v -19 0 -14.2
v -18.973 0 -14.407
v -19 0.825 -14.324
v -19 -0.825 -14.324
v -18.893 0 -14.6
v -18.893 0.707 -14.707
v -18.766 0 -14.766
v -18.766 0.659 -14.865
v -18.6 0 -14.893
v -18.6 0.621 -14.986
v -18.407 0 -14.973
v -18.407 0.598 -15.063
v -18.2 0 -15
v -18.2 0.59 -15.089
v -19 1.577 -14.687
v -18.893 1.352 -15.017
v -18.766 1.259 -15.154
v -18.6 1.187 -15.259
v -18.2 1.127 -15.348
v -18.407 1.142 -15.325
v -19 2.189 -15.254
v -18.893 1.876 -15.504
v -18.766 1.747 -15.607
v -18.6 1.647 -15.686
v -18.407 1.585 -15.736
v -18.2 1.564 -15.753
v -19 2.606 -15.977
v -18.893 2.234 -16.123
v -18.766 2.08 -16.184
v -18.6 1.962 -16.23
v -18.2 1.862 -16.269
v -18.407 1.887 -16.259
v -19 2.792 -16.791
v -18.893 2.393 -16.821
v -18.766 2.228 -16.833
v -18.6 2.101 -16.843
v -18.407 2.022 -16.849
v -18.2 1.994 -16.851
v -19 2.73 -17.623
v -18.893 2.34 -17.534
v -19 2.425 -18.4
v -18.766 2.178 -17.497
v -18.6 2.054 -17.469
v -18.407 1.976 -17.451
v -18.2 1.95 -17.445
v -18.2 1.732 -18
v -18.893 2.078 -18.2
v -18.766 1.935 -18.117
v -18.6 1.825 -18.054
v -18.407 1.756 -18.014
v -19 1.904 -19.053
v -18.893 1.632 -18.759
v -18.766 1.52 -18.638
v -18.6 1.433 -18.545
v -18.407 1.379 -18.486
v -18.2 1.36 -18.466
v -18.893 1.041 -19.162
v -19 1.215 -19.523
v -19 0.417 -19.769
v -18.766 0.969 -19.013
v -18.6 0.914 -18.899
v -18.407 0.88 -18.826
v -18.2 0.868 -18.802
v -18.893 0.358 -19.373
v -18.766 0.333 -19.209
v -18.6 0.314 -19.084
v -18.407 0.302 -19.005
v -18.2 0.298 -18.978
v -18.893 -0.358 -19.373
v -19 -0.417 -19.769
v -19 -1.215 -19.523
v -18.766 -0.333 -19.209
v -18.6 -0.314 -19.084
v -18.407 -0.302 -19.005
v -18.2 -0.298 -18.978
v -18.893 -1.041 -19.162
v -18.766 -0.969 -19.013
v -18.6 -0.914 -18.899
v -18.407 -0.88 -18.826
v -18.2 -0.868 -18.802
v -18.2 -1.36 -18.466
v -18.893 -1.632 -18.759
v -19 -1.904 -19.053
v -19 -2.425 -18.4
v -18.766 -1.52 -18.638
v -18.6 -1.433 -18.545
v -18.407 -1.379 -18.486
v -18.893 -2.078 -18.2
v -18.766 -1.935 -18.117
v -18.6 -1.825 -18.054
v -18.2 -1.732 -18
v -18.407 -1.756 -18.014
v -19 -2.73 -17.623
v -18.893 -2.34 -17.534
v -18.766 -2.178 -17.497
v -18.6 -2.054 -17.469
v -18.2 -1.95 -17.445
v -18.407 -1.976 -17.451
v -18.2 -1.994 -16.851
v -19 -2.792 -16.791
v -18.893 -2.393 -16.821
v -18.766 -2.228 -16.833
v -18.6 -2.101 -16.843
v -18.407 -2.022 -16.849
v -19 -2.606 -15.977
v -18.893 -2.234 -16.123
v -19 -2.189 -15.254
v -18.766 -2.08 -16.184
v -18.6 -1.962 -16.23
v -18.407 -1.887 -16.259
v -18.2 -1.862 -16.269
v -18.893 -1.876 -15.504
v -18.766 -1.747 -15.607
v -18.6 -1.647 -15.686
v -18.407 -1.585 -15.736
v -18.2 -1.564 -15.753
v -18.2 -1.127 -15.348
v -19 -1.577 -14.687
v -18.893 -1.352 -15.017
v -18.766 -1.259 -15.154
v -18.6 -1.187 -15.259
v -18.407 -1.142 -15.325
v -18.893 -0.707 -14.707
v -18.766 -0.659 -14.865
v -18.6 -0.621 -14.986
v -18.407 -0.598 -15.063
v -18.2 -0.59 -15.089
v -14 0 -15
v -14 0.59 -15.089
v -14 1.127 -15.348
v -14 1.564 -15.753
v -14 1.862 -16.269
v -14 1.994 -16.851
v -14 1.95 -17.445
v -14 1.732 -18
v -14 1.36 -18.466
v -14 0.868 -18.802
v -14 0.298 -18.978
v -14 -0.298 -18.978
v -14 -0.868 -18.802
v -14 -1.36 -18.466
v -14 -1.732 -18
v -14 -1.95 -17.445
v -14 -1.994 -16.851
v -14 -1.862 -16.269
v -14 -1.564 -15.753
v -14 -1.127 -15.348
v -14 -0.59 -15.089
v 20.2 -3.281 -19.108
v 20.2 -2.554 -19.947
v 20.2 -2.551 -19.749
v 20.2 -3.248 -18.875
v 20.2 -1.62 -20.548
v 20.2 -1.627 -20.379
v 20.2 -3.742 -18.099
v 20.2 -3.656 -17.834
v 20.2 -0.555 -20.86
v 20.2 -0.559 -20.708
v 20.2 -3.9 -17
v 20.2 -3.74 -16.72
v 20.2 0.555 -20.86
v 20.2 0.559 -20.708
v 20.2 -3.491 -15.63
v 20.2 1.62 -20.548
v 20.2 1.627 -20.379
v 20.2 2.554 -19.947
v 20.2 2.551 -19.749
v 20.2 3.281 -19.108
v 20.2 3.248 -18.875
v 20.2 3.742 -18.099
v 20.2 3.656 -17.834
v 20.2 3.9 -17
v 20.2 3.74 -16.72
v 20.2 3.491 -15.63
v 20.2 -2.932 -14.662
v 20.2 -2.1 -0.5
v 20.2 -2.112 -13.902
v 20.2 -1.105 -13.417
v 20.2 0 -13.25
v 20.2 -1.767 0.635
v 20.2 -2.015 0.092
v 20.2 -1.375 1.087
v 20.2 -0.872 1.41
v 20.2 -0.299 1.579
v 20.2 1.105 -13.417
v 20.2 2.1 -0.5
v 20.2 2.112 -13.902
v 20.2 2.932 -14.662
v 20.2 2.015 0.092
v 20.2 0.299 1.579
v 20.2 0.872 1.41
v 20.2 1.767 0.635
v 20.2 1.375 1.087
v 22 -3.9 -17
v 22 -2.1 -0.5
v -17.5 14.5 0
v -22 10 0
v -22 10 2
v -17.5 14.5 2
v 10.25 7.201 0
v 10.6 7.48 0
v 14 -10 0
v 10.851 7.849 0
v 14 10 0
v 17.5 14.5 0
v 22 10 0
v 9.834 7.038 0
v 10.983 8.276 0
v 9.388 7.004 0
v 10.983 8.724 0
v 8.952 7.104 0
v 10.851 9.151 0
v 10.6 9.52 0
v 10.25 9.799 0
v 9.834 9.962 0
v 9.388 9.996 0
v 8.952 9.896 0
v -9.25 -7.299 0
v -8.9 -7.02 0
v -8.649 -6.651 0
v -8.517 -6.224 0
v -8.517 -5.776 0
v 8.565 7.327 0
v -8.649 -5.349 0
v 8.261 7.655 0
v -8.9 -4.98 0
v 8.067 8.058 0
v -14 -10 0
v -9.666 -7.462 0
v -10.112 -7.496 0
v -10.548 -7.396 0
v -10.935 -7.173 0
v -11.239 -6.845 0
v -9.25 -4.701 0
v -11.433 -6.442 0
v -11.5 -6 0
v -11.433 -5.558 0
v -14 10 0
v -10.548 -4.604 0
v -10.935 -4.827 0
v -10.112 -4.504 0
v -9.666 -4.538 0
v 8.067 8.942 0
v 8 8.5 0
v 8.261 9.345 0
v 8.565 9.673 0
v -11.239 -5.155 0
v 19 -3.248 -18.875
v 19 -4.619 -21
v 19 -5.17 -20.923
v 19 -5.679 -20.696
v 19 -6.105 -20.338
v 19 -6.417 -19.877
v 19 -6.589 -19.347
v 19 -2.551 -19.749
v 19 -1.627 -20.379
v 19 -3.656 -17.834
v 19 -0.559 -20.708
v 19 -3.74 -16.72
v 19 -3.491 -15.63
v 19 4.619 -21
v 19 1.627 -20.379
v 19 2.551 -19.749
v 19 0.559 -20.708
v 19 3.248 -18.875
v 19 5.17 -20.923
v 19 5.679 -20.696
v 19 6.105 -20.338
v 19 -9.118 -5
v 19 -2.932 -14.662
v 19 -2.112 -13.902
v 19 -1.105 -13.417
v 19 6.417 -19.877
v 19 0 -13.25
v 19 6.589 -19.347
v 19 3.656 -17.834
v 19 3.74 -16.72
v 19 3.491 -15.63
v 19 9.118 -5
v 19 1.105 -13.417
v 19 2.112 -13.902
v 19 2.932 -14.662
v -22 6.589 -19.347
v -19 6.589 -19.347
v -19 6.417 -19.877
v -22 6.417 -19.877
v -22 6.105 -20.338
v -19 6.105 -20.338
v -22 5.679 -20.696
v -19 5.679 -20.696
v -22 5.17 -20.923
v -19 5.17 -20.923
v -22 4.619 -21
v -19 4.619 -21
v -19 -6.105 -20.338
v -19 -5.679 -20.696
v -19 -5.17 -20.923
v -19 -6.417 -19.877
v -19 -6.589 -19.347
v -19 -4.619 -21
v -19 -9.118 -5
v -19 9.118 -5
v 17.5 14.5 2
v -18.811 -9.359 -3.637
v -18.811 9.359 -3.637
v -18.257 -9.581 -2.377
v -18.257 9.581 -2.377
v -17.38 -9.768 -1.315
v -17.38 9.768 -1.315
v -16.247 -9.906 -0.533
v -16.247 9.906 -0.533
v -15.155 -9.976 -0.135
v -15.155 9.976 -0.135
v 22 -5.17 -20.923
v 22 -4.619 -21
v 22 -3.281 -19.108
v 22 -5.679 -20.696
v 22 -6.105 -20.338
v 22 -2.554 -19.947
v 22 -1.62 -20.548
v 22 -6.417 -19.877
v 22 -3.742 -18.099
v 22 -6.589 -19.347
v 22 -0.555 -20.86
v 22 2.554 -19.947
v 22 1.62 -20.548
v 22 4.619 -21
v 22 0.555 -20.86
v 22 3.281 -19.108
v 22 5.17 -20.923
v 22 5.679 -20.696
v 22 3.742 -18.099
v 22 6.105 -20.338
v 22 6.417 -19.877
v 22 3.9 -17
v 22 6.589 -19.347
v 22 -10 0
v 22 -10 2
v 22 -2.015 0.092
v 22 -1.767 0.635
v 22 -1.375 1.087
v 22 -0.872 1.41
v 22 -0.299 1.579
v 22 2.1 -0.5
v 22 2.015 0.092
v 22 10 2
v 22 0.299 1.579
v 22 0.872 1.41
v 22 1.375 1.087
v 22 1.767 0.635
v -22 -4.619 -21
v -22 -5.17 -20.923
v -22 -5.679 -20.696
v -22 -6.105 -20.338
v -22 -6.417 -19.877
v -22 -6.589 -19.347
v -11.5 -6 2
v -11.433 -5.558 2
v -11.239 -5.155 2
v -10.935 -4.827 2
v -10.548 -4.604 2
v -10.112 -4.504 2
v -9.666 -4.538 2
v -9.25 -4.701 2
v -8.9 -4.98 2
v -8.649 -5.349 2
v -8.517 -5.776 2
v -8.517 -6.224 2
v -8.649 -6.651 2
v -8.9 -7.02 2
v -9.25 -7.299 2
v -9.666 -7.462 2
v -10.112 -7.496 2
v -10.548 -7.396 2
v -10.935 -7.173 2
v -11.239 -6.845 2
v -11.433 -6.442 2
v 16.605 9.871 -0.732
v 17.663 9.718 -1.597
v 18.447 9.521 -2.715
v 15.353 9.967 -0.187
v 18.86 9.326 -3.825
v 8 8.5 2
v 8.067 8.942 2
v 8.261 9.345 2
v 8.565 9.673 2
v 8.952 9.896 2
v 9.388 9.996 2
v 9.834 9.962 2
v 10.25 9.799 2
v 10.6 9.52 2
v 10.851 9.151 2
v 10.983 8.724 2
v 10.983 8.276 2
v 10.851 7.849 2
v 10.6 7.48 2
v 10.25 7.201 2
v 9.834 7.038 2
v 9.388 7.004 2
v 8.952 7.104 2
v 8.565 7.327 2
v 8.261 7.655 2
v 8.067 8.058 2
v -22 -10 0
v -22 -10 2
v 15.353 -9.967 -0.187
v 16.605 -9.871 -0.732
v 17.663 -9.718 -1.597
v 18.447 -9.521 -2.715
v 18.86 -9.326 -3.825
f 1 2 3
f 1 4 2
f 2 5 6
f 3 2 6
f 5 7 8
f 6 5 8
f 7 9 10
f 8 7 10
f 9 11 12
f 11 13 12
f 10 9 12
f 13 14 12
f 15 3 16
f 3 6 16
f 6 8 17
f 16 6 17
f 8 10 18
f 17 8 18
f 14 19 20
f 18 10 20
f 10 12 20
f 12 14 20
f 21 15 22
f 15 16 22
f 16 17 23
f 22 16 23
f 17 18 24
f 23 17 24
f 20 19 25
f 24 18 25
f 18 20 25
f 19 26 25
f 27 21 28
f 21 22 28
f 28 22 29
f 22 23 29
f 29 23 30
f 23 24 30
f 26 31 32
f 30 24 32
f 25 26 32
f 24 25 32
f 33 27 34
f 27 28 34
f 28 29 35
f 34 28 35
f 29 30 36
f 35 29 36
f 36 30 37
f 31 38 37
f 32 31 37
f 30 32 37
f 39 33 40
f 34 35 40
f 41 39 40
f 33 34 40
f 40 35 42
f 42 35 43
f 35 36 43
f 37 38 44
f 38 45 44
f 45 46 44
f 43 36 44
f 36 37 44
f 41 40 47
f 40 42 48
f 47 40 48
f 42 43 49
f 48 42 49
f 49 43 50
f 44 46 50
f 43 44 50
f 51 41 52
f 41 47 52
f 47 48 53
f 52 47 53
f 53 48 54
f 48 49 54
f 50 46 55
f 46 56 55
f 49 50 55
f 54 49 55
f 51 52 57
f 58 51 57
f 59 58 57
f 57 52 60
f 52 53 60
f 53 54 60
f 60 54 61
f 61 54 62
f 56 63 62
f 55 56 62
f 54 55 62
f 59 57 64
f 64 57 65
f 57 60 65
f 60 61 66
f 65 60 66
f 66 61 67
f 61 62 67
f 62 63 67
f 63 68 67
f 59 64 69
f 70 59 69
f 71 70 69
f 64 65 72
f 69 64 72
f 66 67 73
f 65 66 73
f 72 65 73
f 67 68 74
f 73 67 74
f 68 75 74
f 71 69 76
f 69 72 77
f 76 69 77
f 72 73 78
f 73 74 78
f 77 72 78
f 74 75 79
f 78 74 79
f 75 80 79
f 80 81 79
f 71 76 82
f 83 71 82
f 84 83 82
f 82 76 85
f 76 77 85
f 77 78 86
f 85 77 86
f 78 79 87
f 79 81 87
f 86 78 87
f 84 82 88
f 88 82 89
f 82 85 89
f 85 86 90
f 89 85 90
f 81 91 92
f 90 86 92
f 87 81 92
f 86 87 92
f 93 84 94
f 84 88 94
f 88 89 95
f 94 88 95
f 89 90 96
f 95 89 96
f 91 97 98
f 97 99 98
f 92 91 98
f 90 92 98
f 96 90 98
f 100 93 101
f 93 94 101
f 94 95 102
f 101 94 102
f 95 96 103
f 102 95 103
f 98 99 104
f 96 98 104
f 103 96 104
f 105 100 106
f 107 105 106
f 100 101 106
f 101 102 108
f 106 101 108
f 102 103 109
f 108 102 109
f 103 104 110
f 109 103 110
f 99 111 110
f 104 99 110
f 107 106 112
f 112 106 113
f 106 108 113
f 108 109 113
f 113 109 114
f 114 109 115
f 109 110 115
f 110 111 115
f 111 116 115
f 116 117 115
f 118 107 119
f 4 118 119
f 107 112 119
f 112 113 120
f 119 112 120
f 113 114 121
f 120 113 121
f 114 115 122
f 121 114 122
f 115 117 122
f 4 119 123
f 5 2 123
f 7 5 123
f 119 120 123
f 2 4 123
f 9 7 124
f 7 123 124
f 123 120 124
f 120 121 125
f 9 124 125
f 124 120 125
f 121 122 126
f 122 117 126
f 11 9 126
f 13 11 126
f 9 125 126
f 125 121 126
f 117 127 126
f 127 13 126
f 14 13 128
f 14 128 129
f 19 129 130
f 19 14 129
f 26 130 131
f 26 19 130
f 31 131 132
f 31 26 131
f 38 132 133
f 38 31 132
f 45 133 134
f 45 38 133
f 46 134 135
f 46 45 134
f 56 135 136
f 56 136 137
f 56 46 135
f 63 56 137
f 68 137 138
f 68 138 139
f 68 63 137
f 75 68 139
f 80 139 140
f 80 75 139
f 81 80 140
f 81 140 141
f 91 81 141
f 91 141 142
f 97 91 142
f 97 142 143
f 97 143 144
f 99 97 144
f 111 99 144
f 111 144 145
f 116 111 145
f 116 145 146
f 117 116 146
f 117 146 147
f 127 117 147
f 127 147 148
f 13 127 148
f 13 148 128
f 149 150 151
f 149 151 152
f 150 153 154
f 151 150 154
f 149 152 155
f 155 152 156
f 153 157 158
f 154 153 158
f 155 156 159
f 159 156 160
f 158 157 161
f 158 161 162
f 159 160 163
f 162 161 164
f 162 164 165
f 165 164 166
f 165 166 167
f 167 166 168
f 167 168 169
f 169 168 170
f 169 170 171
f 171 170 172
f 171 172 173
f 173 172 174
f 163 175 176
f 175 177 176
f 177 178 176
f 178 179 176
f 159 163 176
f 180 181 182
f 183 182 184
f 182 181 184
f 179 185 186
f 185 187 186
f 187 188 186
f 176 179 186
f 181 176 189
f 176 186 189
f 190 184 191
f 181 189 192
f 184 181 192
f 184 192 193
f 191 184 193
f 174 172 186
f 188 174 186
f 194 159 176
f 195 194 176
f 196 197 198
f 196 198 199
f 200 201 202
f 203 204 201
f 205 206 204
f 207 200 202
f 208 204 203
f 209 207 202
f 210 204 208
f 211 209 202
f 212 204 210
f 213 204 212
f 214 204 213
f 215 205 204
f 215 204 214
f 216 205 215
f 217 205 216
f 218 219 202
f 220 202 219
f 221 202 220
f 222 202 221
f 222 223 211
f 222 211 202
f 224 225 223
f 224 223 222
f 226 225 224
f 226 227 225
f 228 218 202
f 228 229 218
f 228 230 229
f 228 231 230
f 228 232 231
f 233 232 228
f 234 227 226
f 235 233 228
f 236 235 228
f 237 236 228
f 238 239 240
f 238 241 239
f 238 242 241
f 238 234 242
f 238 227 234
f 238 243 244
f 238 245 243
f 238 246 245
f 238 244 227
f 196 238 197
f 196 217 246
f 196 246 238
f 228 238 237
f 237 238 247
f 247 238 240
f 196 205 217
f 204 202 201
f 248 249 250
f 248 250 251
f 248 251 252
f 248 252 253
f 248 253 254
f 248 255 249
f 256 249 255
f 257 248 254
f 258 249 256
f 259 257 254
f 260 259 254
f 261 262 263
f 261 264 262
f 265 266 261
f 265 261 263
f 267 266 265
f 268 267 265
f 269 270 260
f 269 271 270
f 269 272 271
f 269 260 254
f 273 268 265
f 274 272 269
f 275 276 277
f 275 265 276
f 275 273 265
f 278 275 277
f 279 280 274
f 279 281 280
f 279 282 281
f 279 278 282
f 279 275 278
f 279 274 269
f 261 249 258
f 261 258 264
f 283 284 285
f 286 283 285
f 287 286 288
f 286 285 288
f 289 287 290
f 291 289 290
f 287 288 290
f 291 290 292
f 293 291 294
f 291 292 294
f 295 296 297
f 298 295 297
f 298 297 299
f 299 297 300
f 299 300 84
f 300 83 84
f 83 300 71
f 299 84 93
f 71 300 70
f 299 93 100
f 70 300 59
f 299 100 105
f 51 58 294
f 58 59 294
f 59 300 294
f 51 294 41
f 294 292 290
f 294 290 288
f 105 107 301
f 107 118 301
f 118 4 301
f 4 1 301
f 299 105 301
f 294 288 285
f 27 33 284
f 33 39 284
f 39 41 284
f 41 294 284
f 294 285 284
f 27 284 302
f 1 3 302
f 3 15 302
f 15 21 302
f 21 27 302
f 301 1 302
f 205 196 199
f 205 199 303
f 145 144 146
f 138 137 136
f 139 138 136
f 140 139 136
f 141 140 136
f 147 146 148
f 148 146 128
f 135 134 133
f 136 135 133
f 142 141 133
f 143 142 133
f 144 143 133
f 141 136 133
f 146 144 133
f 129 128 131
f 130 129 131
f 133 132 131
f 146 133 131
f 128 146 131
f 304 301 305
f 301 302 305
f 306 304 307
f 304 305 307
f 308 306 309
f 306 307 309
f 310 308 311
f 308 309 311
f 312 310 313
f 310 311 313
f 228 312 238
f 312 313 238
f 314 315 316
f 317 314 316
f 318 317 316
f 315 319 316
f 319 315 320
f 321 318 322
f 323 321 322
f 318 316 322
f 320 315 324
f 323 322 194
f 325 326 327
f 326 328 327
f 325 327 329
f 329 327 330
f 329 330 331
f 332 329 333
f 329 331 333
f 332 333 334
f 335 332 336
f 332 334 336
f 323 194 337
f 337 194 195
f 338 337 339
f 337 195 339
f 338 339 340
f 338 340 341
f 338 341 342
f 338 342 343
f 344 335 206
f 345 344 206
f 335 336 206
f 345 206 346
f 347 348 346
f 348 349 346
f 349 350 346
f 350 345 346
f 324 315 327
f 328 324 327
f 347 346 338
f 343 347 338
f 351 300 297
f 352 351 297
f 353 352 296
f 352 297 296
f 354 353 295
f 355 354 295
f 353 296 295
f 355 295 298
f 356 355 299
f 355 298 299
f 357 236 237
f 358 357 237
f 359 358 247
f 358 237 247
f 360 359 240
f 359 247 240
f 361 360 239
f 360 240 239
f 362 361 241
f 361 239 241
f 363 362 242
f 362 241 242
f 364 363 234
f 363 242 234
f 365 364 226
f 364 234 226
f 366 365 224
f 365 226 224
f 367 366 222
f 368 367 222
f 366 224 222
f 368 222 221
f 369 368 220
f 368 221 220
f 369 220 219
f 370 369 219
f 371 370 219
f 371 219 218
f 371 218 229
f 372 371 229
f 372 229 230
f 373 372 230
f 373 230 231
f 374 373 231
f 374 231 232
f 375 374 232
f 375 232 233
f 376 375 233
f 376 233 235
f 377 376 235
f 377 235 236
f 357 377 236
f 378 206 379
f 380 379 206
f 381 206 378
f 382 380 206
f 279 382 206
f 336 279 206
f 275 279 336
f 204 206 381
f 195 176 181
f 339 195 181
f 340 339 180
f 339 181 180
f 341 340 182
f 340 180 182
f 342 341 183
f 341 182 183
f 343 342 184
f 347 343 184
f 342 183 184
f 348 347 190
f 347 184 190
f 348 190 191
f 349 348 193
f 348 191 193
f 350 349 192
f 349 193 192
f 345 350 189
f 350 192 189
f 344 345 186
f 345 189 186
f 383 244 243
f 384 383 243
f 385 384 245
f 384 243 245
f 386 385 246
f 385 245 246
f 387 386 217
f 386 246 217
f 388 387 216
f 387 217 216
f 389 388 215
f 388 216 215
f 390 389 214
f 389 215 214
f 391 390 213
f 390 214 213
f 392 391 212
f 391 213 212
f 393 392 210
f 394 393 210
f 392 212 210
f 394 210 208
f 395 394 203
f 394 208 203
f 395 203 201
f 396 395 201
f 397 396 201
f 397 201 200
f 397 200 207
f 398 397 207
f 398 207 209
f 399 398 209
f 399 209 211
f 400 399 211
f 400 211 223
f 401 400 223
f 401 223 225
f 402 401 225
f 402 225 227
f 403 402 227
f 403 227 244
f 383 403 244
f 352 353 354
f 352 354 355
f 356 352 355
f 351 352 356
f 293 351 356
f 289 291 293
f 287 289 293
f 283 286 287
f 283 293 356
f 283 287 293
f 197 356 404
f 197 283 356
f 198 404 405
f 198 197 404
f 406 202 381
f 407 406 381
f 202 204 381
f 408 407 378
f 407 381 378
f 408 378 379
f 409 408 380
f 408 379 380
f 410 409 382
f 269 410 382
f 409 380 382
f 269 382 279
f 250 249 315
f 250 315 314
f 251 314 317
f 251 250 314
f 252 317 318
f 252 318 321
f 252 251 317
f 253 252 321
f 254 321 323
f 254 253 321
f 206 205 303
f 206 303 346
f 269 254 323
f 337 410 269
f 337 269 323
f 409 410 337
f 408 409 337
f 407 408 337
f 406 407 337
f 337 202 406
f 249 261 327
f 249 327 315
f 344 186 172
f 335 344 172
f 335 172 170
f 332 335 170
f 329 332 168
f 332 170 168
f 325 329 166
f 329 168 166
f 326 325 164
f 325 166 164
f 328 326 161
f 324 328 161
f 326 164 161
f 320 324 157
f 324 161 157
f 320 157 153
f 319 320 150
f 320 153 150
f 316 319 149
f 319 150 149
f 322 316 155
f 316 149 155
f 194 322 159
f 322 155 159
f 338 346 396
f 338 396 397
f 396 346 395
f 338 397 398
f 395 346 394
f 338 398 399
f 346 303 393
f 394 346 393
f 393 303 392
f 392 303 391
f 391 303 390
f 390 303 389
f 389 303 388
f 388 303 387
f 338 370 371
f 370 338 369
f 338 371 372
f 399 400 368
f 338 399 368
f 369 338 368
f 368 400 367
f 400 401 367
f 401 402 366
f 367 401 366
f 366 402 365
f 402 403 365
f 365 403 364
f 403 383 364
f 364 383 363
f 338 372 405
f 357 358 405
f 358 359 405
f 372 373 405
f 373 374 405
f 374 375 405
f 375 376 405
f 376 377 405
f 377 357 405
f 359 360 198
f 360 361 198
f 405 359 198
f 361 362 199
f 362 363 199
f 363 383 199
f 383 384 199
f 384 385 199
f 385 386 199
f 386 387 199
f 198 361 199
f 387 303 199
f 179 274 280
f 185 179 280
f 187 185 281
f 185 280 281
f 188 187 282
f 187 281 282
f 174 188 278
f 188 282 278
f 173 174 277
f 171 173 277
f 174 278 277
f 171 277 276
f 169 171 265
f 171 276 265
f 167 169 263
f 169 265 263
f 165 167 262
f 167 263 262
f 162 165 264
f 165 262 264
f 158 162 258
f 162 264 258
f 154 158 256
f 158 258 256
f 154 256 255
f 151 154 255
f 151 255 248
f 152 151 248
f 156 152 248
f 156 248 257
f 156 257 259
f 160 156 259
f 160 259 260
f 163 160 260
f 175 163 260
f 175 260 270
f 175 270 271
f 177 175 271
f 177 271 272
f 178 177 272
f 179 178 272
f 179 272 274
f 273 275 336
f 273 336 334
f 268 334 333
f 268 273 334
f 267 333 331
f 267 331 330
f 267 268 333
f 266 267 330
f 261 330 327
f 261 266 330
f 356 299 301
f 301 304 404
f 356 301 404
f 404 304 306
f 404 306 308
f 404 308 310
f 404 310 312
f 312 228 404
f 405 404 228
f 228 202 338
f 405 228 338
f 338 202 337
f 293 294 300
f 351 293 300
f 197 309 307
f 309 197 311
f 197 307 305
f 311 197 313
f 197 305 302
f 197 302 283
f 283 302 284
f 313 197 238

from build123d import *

# Parameters (mm, degrees)
SKETCH1_W           = 38
SKETCH1_H           = 20
BOSS_EXTRUDE1_DEPTH = 2
BOSS_EXTRUDE2_DEPTH = 3
BOSS_EXTRUDE3_DEPTH = 2
SKETCH4_R           = 1.6
CUT_EXTRUDE1_DEPTH  = 51.865017448
CUT_EXTRUDE2_START  = -1.2
CUT_EXTRUDE2_DEPTH  = 2
SKETCH6_R           = 3.75
CUT_EXTRUDE3_DEPTH  = 2.4
CUT_EXTRUDE4_DEPTH  = 34.693471178
SKETCH8_R           = 2
BOSS_EXTRUDE4_DEPTH = 8
FILLET1_R           = 0.8
FILLET2_R           = 5
SKETCH9_R           = 1.5
CUT_EXTRUDE5_DEPTH  = 10


with BuildPart() as part:
    # Sketch1 → Boss-Extrude1 (new body)
    with BuildSketch(Plane.XY):
        Rectangle(SKETCH1_W, SKETCH1_H)
    extrude(amount=BOSS_EXTRUDE1_DEPTH)

    # Sketch2 → Boss-Extrude2 (add)
    with BuildSketch(Plane(origin=(19, 0, 0), x_dir=(0, 0, -1), z_dir=(1, 0, 0))):
        with BuildLine():
            Line((-2, 10), (0, 10))
            Line((0, 10), (19.347296355, 6.588549649))
            ThreePointArc((19.347296355, 6.588549649), (20.532088886, 5.904509362), (21, 4.618934143))
            Line((21, 4.618934143), (21, -4.618934143))
            ThreePointArc((21, -4.618934143), (20.532088886, -5.904509362), (19.347296355, -6.588549649))
            Line((19.347296355, -6.588549649), (0, -10))
            Line((0, -10), (-2, -10))
            Line((-2, -10), (-2, 10))
        make_face()
    boss_extrude2 = extrude(amount=BOSS_EXTRUDE2_DEPTH)

    # Mirror1: Boss-Extrude2 across plane
    add(boss_extrude2.mirror(Plane(origin=(0, 0, 0), x_dir=(0, 0, 1), z_dir=(1, 0, 0))))

    # Sketch3 → Boss-Extrude3 (add)
    with BuildSketch(Plane(origin=(0, 0, 0), x_dir=(-1, 0, 0), z_dir=(0, 0, -1))):
        Polygon((-22, -10), (-17.5, -14.5), (17.5, -14.5), (22, -10), align=None)
        Polygon((-22, 10), (22, 10), (17.5, 14.5), (-17.5, 14.5), align=None)
    extrude(amount=-BOSS_EXTRUDE3_DEPTH)

    # Sketch4 → Cut-Extrude1 (cut, through all)
    with BuildSketch(Plane.ZY.offset(22)):
        with Locations((-17, 0)):
            Circle(SKETCH4_R)
    extrude(amount=-CUT_EXTRUDE1_DEPTH, mode=Mode.SUBTRACT)

    # Sketch5 → Cut-Extrude2 (cut)
    with BuildSketch(Plane.ZY.offset(-19).offset(CUT_EXTRUDE2_START)):
        with BuildLine():
            Line((-17, -3.9), (-0.5, -2.1))
            ThreePointArc((-0.5, -2.1), (1.6, 0), (-0.5, 2.1))
            Line((-0.5, 2.1), (-17, 3.9))
            ThreePointArc((-17, 3.9), (-20.9, 0), (-17, -3.9))
        make_face()
    extrude(amount=-CUT_EXTRUDE2_DEPTH, mode=Mode.SUBTRACT)

    # Sketch6 → Cut-Extrude3 (cut)
    with BuildSketch(Plane.ZY.offset(-19)):
        with Locations((-17, 0)):
            Circle(SKETCH6_R)
    extrude(amount=-CUT_EXTRUDE3_DEPTH, mode=Mode.SUBTRACT)

    # Sketch7 → Cut-Extrude4 (cut, through all)
    with BuildSketch(Plane(origin=(0, 0, 0), x_dir=(-1, 0, 0), z_dir=(0, 0, -1))):
        Polygon((17.5, -14.5), (22, -10), (19, -10), (-19, -10), (-22, -10), (-17.5, -14.5), align=None)
    extrude(amount=-CUT_EXTRUDE4_DEPTH, mode=Mode.SUBTRACT)

    # Sketch8 → Boss-Extrude4 (add)
    with BuildSketch(Plane.ZY.offset(22)):
        with Locations((-17, 0)):
            Circle(SKETCH8_R)
    extrude(amount=-BOSS_EXTRUDE4_DEPTH)

    # Fillet1
    fillet1_edges = [part.edges().sort_by_distance(p)[0] for p in [
        (-19, 0, -19),
    ]]
    fillet(fillet1_edges, radius=FILLET1_R)

    # Fillet2
    fillet2_edges = [part.edges().sort_by_distance(p)[0] for p in [
        (-19, 0, 0),
        (19, 0, 0),
    ]]
    fillet(fillet2_edges, radius=FILLET2_R)

    # Sketch9 → Cut-Extrude5 (cut)
    with BuildSketch(Plane(origin=(0, 0, 0), x_dir=(-1, 0, 0), z_dir=(0, 0, -1))):
        with Locations((-9.5, 8.5)):
            Circle(SKETCH9_R)
        with Locations((10, -6)):
            Circle(SKETCH9_R)
    extrude(amount=-CUT_EXTRUDE5_DEPTH, mode=Mode.SUBTRACT)


solid = part.part
